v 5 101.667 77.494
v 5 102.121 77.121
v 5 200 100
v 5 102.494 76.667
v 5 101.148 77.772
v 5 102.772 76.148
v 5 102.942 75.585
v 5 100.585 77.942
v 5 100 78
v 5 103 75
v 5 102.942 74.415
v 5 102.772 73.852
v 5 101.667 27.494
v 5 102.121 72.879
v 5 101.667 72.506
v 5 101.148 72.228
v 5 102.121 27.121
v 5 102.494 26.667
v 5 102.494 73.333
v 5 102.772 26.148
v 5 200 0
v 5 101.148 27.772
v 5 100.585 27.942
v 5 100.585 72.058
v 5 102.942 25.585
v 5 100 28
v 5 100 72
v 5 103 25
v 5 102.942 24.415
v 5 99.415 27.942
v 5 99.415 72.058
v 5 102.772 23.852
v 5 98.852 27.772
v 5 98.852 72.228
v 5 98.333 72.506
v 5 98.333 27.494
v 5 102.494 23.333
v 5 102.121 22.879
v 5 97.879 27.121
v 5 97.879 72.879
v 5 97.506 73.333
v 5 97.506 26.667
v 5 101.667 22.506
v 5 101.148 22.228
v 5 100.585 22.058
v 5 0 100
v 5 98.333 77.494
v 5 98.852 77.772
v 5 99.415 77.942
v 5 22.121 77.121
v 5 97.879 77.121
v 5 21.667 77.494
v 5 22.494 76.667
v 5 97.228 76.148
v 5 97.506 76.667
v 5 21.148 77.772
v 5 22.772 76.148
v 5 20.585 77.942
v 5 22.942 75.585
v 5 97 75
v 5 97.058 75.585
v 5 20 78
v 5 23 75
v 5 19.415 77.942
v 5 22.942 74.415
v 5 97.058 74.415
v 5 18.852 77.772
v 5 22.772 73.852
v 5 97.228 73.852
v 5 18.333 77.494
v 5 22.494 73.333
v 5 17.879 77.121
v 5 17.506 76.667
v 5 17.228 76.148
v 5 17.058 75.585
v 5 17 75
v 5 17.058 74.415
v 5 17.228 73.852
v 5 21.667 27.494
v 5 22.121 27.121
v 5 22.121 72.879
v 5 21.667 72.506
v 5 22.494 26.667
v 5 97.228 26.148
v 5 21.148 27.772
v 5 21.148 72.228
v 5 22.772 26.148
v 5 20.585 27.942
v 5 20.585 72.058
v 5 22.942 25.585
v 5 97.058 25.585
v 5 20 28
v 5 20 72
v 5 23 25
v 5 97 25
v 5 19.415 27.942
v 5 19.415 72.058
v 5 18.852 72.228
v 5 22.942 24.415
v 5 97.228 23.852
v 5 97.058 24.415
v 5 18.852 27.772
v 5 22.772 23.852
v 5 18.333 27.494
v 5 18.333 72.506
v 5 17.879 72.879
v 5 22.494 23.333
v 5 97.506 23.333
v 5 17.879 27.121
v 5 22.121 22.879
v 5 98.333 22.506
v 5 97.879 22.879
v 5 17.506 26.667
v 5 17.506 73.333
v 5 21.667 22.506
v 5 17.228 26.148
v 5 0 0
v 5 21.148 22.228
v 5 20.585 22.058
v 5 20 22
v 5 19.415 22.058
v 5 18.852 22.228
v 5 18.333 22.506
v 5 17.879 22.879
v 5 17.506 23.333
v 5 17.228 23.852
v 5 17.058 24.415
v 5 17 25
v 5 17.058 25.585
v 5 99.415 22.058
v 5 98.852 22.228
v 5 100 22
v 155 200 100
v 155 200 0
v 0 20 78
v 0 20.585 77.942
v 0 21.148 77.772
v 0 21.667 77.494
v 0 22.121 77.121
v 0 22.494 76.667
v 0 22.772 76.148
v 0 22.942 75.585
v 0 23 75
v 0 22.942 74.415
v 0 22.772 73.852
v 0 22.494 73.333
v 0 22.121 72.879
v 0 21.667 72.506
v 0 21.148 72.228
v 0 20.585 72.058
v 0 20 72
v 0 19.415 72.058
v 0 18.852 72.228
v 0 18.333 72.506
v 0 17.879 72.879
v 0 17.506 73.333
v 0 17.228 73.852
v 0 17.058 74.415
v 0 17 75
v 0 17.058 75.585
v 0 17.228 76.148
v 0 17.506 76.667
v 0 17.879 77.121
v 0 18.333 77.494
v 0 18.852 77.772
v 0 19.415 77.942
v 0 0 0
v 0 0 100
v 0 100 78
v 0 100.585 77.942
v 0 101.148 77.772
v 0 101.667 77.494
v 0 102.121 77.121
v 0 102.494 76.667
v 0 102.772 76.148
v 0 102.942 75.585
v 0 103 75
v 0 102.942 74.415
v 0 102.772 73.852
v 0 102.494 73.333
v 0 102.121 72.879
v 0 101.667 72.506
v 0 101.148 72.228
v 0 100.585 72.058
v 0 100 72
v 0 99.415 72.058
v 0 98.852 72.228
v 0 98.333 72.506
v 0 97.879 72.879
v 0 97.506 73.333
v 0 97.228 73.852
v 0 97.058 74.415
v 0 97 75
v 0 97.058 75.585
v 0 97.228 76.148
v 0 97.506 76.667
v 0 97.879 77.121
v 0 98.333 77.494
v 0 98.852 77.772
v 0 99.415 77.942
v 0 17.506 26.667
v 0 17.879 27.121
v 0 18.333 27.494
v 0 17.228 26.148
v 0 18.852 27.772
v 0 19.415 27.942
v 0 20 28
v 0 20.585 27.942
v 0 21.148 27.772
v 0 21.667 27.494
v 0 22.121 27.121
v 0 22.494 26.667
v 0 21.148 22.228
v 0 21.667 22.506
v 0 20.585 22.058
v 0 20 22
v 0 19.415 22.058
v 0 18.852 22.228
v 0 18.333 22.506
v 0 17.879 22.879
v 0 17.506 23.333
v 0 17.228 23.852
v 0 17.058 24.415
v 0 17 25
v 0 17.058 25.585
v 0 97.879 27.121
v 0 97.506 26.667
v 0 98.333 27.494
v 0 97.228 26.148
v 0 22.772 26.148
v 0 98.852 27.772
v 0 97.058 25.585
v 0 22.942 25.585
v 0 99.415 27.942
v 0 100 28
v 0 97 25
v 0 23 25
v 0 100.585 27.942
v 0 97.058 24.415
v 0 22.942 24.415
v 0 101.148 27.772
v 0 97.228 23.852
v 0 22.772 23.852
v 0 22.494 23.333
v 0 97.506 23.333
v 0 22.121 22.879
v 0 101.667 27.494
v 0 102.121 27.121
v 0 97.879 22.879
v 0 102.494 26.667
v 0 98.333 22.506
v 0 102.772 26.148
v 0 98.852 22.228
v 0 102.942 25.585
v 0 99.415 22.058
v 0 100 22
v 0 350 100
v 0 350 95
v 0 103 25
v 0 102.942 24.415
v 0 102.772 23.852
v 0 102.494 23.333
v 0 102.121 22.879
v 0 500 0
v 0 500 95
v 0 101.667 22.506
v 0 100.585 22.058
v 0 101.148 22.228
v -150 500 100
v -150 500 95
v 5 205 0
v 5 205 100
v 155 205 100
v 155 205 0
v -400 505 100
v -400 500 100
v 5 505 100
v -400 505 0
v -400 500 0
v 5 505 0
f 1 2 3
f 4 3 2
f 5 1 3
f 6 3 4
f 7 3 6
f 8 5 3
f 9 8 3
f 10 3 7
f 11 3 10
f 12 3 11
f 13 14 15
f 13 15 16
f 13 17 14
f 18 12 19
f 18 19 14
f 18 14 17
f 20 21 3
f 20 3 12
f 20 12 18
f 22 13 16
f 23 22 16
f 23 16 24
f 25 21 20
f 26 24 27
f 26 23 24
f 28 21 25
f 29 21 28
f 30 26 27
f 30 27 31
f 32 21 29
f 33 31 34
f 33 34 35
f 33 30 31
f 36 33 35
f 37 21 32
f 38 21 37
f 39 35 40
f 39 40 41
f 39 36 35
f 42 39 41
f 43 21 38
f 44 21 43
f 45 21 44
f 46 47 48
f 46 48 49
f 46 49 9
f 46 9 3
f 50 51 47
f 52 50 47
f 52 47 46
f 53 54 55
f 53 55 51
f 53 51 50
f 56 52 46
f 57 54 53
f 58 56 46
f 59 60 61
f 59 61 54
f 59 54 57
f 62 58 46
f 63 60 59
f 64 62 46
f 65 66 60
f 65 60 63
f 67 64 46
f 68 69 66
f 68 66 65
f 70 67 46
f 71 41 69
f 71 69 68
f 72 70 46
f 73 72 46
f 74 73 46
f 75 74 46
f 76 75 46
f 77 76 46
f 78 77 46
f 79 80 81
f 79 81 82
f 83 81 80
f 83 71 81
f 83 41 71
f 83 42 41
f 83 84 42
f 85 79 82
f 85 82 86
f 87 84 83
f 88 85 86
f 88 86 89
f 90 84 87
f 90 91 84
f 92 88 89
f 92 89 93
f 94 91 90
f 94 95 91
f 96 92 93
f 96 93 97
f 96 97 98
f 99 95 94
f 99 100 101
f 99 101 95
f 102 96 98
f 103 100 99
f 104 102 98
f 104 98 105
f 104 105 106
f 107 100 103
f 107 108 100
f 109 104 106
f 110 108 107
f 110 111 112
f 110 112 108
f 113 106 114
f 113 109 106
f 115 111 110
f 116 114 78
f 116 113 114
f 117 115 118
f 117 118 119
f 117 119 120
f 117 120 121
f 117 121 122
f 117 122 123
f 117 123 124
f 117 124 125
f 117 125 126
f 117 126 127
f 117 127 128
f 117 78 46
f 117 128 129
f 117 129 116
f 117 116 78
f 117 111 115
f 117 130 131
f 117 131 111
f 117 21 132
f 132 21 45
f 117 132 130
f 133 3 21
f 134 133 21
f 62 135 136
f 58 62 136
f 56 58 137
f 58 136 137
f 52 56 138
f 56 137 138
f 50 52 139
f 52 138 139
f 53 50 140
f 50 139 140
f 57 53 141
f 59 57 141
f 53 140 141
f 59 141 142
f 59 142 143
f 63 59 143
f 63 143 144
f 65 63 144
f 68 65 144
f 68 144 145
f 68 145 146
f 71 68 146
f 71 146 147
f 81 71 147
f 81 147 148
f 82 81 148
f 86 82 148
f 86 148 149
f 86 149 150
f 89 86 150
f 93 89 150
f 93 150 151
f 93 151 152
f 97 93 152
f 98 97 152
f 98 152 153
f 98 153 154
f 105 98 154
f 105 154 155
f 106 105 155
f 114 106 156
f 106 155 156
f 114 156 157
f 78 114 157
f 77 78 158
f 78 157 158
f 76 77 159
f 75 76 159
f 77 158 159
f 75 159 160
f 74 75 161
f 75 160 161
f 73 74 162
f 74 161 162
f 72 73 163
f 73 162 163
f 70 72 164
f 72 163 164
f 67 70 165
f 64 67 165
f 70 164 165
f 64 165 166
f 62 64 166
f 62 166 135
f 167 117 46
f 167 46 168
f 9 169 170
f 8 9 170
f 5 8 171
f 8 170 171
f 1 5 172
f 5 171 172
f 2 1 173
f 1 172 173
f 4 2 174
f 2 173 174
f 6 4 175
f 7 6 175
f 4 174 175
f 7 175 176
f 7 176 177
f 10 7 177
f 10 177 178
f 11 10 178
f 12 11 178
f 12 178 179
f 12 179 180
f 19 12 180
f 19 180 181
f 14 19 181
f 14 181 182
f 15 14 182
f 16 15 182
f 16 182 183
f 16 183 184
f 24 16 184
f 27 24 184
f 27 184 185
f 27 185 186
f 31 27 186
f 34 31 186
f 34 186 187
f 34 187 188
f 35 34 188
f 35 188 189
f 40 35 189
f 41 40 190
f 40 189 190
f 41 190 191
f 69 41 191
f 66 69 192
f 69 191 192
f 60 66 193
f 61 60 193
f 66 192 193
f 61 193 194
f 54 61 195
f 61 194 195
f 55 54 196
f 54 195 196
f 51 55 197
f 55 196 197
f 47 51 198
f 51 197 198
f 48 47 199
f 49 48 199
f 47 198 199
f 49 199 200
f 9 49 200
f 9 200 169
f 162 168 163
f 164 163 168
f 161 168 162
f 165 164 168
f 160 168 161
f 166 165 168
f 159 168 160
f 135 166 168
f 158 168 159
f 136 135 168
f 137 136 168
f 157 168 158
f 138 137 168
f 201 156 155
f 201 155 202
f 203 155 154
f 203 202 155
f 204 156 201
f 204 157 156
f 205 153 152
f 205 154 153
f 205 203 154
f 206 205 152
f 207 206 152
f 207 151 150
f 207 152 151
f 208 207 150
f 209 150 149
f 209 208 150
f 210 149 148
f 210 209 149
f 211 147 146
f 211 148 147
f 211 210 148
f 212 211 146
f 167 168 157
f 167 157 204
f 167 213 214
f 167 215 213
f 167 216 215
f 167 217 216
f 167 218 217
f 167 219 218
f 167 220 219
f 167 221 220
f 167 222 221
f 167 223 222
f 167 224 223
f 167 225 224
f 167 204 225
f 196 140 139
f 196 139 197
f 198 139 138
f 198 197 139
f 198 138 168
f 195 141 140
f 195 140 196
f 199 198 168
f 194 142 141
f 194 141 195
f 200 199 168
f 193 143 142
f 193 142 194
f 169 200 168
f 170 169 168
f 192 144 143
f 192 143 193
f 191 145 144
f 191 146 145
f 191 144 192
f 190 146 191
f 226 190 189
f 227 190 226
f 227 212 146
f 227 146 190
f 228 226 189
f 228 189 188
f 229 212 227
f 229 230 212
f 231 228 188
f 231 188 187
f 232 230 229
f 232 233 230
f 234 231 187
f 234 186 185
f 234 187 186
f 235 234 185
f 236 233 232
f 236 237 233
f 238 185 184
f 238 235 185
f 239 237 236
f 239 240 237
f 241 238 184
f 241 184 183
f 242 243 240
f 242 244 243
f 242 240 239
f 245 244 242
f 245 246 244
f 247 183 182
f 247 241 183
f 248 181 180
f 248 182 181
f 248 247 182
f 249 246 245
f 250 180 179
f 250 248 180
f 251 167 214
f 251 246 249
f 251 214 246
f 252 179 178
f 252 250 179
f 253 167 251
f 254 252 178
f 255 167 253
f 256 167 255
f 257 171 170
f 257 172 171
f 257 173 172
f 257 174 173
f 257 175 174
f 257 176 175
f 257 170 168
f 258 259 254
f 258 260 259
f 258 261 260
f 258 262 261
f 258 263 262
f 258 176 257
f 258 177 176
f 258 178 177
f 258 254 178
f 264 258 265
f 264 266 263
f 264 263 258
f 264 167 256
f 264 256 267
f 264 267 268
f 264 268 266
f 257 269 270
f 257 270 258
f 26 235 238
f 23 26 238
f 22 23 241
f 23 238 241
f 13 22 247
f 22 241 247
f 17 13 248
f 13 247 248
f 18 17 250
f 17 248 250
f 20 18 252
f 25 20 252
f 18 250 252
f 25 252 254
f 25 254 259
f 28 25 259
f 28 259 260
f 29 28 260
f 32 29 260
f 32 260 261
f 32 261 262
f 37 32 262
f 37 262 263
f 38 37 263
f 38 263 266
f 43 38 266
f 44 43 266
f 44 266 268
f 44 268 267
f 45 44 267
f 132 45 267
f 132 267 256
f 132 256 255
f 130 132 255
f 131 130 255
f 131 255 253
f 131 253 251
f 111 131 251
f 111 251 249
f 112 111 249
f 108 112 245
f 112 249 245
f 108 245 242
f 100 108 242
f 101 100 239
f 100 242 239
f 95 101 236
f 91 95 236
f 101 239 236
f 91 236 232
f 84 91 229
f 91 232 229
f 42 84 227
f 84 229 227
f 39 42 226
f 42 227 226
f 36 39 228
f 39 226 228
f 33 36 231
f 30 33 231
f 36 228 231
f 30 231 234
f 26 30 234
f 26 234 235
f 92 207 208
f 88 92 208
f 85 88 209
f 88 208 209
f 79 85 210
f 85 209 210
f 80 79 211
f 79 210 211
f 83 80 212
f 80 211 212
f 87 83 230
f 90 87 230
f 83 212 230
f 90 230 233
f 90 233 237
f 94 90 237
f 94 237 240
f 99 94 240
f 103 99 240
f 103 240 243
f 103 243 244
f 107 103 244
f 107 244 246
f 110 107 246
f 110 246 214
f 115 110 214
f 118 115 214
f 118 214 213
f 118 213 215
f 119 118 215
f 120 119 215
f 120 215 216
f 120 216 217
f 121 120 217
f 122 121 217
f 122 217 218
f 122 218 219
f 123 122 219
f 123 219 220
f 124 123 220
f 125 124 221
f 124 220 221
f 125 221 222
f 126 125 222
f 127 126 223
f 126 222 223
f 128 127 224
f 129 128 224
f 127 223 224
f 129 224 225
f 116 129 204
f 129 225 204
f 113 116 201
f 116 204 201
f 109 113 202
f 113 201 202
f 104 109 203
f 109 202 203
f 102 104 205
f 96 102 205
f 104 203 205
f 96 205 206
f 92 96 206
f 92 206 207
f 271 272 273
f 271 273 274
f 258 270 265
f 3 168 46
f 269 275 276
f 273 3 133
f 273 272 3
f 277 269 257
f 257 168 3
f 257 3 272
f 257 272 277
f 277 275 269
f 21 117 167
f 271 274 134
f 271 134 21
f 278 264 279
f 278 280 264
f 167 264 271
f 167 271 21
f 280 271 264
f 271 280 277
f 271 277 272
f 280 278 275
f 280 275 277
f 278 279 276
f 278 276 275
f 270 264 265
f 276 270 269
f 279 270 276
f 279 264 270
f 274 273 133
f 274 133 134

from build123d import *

# Parameters (mm, degrees)
EXTRUDE_THIN1_DEPTH   = 100
F_6_0MM_DOWEL_HOLE1_D = 6
SKETCH8_W             = 100
SKETCH8_H             = 5
BOSS_EXTRUDE3_DEPTH   = 150
BOSS_EXTRUDE4_DEPTH   = 5


with BuildPart() as part:
    # Sketch1 → Extrude-Thin1 (new body)
    with BuildSketch(Plane.XY):
        Polygon((0, 0), (0, 500), (-400, 500), (-400, 505), (5, 505), (5, 0), align=None)
    extrude(amount=EXTRUDE_THIN1_DEPTH)

    # Ø6.0mm Dowel Hole1 (through all)
    with Locations(Plane(origin=(5, 0, 0), x_dir=(0, 0, -1), z_dir=(1, 0, 0))):
        with Locations((-25, 100), (-75, 100), (-75, 20), (-25, 20)):
            Hole(F_6_0MM_DOWEL_HOLE1_D / 2)

    # Sketch8 → Boss-Extrude3 (add)
    with BuildSketch(Plane(origin=(5, 0, 0), x_dir=(0, 0, -1), z_dir=(1, 0, 0))):
        with Locations((-50, 202.5)):
            Rectangle(SKETCH8_W, SKETCH8_H)
    extrude(amount=BOSS_EXTRUDE3_DEPTH)

    # Sketch9 → Boss-Extrude4 (add)
    with BuildSketch(Plane.XY.offset(100)):
        Polygon((-150, 500), (0, 350), (0, 500), align=None)
    extrude(amount=-BOSS_EXTRUDE4_DEPTH)


solid = part.part
